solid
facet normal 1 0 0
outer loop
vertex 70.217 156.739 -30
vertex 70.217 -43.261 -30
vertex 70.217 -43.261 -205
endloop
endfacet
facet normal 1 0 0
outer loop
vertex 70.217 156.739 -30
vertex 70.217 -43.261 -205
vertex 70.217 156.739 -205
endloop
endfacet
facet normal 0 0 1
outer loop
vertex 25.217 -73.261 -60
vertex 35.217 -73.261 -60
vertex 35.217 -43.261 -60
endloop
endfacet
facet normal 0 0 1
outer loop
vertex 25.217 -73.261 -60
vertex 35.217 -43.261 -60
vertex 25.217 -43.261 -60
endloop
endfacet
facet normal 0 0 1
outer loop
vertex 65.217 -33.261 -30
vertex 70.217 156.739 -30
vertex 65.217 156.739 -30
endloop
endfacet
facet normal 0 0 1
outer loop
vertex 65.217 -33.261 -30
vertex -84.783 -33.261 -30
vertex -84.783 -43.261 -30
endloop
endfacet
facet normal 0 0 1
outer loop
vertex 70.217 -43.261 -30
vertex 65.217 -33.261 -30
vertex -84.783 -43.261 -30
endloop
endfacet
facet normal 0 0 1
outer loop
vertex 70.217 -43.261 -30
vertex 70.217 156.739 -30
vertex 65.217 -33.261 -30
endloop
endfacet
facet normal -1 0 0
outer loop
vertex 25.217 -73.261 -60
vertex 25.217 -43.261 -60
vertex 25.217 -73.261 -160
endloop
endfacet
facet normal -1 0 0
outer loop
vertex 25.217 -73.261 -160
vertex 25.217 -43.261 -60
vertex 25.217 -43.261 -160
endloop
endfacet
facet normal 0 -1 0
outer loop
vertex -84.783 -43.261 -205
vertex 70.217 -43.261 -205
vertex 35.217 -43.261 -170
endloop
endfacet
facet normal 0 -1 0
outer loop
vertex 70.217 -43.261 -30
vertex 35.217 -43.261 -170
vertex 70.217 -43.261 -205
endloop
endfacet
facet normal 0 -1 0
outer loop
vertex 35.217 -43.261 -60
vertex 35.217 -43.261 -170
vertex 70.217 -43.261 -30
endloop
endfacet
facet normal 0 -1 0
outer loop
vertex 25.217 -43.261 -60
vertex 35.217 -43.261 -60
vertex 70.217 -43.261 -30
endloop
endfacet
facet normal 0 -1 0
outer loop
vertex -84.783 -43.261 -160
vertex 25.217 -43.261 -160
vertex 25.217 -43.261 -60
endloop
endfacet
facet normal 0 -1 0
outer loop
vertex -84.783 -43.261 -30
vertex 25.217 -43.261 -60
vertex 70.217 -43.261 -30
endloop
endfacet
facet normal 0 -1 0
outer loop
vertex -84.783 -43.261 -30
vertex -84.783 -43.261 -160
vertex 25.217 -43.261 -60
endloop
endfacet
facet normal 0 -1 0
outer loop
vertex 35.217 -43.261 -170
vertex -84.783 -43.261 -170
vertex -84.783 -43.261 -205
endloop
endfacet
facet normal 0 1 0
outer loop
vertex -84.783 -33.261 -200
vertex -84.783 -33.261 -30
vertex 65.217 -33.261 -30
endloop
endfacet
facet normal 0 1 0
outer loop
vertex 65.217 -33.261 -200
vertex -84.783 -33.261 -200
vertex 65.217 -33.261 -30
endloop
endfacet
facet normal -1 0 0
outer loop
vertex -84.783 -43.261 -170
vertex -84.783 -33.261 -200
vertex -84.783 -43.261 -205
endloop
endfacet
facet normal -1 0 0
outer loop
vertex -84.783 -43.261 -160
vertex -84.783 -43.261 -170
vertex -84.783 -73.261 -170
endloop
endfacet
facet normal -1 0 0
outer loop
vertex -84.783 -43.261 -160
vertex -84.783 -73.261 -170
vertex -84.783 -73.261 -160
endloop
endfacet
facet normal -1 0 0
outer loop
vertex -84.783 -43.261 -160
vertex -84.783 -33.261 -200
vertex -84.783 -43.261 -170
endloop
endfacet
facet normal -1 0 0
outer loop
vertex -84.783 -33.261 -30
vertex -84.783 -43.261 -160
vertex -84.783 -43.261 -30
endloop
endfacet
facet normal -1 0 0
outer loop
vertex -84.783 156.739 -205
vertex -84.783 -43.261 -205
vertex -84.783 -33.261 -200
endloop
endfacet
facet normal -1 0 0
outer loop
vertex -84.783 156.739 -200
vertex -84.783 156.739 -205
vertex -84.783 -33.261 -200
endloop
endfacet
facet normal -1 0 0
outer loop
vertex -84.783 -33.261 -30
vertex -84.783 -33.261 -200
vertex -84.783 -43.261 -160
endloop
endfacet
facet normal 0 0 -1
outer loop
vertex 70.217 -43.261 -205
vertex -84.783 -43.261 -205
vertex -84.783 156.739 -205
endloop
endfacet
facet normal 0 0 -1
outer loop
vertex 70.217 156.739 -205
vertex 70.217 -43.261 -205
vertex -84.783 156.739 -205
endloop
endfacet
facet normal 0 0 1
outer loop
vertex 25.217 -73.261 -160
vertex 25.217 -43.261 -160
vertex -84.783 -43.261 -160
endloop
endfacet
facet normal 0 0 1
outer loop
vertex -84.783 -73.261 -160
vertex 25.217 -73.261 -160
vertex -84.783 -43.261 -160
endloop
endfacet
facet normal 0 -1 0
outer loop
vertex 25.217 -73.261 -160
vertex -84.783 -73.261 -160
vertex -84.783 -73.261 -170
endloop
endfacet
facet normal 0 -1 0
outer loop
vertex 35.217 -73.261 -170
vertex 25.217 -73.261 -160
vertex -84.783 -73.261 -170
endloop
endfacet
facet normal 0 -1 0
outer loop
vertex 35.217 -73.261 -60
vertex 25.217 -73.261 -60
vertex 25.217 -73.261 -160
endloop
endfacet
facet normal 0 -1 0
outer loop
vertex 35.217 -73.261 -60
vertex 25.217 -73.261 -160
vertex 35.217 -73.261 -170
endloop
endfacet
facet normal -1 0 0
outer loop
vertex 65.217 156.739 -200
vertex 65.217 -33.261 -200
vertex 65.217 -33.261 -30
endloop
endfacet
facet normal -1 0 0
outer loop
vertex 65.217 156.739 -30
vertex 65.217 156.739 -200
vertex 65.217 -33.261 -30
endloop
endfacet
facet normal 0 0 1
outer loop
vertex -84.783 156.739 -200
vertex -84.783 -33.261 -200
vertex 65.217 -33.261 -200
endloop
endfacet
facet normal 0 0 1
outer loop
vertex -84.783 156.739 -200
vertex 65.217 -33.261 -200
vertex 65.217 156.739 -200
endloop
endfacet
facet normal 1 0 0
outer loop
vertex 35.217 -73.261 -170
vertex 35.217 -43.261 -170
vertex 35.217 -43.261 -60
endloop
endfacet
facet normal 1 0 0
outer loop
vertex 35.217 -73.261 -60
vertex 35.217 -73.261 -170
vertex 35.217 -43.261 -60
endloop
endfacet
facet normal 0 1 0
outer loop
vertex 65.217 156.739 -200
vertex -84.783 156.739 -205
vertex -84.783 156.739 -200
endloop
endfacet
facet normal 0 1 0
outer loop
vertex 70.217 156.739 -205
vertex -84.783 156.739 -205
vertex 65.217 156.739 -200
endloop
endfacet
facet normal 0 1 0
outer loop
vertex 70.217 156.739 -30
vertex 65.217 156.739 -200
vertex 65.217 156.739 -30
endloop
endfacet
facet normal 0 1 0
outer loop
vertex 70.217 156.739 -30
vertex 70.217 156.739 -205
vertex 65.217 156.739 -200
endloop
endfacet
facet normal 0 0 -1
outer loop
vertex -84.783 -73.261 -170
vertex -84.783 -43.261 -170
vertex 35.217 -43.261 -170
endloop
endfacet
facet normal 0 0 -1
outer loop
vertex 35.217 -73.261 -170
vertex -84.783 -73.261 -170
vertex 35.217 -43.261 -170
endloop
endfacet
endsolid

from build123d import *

# Parameters (mm, degrees)
SKETCH1_W               = 150
SKETCH1_H               = 10
BOSS_EXTRUDE1_DEPTH     = 200
BOSS_EXTRUDE2_DEPTH     = 205
SKETCH3_W               = 5
SKETCH3_H               = 300
BOSS_EXTRUDE3_DEPTH     = 150
BOSS_EXTRUDE4_DEPTH     = 30
CUT_EXTRUDE3_DEPTH      = 151
CUT_EXTRUDE3_DEPTH_BACK = 6


with BuildPart() as part:
    # Sketch1 → Boss-Extrude1 (new body)
    with BuildSketch(Plane.XY):
        with Locations((-9.782608696, -38.260869565)):
            Rectangle(SKETCH1_W, SKETCH1_H)
    extrude(amount=-BOSS_EXTRUDE1_DEPTH)

    # Sketch2 → Boss-Extrude2 (add)
    with BuildSketch(Plane.XY):
        Polygon((65.217391304, -43.260869565), (70.217391304, -43.260869565), (70.217391304, 256.739130435), (65.217391304, 256.739130435), (65.217391304, -33.260869565), align=None)
    extrude(amount=-BOSS_EXTRUDE2_DEPTH)

    # Sketch3 → Boss-Extrude3 (add)
    with BuildSketch(Plane.ZY.offset(84.782608696)):
        with Locations((-202.5, 106.739130435)):
            Rectangle(SKETCH3_W, SKETCH3_H)
    extrude(amount=-BOSS_EXTRUDE3_DEPTH)

    # Sketch4 → Boss-Extrude4 (add)
    with BuildSketch(Plane.XZ.offset(43.260869565)):
        Polygon((25.217391304, -160), (-84.782608696, -160), (-84.782608696, -170), (35.217391304, -170), (35.217391304, -60), (25.217391304, -60), align=None)
    extrude(amount=BOSS_EXTRUDE4_DEPTH)

    # Sketch5 → Cut-Extrude3 (cut, two sides)
    with BuildSketch(Plane.ZY.offset(-65.217391304)) as cut_extrude3_sk:
        Polygon((-205, 256.739130435), (-205, 156.739130435), (-30, 156.739130435), (-30, -73.260869565), (0, -73.260869565), (0, 256.739130435), align=None)
    extrude(amount=CUT_EXTRUDE3_DEPTH, mode=Mode.SUBTRACT)
    extrude(cut_extrude3_sk.sketch, amount=-CUT_EXTRUDE3_DEPTH_BACK, mode=Mode.SUBTRACT)


solid = part.part
